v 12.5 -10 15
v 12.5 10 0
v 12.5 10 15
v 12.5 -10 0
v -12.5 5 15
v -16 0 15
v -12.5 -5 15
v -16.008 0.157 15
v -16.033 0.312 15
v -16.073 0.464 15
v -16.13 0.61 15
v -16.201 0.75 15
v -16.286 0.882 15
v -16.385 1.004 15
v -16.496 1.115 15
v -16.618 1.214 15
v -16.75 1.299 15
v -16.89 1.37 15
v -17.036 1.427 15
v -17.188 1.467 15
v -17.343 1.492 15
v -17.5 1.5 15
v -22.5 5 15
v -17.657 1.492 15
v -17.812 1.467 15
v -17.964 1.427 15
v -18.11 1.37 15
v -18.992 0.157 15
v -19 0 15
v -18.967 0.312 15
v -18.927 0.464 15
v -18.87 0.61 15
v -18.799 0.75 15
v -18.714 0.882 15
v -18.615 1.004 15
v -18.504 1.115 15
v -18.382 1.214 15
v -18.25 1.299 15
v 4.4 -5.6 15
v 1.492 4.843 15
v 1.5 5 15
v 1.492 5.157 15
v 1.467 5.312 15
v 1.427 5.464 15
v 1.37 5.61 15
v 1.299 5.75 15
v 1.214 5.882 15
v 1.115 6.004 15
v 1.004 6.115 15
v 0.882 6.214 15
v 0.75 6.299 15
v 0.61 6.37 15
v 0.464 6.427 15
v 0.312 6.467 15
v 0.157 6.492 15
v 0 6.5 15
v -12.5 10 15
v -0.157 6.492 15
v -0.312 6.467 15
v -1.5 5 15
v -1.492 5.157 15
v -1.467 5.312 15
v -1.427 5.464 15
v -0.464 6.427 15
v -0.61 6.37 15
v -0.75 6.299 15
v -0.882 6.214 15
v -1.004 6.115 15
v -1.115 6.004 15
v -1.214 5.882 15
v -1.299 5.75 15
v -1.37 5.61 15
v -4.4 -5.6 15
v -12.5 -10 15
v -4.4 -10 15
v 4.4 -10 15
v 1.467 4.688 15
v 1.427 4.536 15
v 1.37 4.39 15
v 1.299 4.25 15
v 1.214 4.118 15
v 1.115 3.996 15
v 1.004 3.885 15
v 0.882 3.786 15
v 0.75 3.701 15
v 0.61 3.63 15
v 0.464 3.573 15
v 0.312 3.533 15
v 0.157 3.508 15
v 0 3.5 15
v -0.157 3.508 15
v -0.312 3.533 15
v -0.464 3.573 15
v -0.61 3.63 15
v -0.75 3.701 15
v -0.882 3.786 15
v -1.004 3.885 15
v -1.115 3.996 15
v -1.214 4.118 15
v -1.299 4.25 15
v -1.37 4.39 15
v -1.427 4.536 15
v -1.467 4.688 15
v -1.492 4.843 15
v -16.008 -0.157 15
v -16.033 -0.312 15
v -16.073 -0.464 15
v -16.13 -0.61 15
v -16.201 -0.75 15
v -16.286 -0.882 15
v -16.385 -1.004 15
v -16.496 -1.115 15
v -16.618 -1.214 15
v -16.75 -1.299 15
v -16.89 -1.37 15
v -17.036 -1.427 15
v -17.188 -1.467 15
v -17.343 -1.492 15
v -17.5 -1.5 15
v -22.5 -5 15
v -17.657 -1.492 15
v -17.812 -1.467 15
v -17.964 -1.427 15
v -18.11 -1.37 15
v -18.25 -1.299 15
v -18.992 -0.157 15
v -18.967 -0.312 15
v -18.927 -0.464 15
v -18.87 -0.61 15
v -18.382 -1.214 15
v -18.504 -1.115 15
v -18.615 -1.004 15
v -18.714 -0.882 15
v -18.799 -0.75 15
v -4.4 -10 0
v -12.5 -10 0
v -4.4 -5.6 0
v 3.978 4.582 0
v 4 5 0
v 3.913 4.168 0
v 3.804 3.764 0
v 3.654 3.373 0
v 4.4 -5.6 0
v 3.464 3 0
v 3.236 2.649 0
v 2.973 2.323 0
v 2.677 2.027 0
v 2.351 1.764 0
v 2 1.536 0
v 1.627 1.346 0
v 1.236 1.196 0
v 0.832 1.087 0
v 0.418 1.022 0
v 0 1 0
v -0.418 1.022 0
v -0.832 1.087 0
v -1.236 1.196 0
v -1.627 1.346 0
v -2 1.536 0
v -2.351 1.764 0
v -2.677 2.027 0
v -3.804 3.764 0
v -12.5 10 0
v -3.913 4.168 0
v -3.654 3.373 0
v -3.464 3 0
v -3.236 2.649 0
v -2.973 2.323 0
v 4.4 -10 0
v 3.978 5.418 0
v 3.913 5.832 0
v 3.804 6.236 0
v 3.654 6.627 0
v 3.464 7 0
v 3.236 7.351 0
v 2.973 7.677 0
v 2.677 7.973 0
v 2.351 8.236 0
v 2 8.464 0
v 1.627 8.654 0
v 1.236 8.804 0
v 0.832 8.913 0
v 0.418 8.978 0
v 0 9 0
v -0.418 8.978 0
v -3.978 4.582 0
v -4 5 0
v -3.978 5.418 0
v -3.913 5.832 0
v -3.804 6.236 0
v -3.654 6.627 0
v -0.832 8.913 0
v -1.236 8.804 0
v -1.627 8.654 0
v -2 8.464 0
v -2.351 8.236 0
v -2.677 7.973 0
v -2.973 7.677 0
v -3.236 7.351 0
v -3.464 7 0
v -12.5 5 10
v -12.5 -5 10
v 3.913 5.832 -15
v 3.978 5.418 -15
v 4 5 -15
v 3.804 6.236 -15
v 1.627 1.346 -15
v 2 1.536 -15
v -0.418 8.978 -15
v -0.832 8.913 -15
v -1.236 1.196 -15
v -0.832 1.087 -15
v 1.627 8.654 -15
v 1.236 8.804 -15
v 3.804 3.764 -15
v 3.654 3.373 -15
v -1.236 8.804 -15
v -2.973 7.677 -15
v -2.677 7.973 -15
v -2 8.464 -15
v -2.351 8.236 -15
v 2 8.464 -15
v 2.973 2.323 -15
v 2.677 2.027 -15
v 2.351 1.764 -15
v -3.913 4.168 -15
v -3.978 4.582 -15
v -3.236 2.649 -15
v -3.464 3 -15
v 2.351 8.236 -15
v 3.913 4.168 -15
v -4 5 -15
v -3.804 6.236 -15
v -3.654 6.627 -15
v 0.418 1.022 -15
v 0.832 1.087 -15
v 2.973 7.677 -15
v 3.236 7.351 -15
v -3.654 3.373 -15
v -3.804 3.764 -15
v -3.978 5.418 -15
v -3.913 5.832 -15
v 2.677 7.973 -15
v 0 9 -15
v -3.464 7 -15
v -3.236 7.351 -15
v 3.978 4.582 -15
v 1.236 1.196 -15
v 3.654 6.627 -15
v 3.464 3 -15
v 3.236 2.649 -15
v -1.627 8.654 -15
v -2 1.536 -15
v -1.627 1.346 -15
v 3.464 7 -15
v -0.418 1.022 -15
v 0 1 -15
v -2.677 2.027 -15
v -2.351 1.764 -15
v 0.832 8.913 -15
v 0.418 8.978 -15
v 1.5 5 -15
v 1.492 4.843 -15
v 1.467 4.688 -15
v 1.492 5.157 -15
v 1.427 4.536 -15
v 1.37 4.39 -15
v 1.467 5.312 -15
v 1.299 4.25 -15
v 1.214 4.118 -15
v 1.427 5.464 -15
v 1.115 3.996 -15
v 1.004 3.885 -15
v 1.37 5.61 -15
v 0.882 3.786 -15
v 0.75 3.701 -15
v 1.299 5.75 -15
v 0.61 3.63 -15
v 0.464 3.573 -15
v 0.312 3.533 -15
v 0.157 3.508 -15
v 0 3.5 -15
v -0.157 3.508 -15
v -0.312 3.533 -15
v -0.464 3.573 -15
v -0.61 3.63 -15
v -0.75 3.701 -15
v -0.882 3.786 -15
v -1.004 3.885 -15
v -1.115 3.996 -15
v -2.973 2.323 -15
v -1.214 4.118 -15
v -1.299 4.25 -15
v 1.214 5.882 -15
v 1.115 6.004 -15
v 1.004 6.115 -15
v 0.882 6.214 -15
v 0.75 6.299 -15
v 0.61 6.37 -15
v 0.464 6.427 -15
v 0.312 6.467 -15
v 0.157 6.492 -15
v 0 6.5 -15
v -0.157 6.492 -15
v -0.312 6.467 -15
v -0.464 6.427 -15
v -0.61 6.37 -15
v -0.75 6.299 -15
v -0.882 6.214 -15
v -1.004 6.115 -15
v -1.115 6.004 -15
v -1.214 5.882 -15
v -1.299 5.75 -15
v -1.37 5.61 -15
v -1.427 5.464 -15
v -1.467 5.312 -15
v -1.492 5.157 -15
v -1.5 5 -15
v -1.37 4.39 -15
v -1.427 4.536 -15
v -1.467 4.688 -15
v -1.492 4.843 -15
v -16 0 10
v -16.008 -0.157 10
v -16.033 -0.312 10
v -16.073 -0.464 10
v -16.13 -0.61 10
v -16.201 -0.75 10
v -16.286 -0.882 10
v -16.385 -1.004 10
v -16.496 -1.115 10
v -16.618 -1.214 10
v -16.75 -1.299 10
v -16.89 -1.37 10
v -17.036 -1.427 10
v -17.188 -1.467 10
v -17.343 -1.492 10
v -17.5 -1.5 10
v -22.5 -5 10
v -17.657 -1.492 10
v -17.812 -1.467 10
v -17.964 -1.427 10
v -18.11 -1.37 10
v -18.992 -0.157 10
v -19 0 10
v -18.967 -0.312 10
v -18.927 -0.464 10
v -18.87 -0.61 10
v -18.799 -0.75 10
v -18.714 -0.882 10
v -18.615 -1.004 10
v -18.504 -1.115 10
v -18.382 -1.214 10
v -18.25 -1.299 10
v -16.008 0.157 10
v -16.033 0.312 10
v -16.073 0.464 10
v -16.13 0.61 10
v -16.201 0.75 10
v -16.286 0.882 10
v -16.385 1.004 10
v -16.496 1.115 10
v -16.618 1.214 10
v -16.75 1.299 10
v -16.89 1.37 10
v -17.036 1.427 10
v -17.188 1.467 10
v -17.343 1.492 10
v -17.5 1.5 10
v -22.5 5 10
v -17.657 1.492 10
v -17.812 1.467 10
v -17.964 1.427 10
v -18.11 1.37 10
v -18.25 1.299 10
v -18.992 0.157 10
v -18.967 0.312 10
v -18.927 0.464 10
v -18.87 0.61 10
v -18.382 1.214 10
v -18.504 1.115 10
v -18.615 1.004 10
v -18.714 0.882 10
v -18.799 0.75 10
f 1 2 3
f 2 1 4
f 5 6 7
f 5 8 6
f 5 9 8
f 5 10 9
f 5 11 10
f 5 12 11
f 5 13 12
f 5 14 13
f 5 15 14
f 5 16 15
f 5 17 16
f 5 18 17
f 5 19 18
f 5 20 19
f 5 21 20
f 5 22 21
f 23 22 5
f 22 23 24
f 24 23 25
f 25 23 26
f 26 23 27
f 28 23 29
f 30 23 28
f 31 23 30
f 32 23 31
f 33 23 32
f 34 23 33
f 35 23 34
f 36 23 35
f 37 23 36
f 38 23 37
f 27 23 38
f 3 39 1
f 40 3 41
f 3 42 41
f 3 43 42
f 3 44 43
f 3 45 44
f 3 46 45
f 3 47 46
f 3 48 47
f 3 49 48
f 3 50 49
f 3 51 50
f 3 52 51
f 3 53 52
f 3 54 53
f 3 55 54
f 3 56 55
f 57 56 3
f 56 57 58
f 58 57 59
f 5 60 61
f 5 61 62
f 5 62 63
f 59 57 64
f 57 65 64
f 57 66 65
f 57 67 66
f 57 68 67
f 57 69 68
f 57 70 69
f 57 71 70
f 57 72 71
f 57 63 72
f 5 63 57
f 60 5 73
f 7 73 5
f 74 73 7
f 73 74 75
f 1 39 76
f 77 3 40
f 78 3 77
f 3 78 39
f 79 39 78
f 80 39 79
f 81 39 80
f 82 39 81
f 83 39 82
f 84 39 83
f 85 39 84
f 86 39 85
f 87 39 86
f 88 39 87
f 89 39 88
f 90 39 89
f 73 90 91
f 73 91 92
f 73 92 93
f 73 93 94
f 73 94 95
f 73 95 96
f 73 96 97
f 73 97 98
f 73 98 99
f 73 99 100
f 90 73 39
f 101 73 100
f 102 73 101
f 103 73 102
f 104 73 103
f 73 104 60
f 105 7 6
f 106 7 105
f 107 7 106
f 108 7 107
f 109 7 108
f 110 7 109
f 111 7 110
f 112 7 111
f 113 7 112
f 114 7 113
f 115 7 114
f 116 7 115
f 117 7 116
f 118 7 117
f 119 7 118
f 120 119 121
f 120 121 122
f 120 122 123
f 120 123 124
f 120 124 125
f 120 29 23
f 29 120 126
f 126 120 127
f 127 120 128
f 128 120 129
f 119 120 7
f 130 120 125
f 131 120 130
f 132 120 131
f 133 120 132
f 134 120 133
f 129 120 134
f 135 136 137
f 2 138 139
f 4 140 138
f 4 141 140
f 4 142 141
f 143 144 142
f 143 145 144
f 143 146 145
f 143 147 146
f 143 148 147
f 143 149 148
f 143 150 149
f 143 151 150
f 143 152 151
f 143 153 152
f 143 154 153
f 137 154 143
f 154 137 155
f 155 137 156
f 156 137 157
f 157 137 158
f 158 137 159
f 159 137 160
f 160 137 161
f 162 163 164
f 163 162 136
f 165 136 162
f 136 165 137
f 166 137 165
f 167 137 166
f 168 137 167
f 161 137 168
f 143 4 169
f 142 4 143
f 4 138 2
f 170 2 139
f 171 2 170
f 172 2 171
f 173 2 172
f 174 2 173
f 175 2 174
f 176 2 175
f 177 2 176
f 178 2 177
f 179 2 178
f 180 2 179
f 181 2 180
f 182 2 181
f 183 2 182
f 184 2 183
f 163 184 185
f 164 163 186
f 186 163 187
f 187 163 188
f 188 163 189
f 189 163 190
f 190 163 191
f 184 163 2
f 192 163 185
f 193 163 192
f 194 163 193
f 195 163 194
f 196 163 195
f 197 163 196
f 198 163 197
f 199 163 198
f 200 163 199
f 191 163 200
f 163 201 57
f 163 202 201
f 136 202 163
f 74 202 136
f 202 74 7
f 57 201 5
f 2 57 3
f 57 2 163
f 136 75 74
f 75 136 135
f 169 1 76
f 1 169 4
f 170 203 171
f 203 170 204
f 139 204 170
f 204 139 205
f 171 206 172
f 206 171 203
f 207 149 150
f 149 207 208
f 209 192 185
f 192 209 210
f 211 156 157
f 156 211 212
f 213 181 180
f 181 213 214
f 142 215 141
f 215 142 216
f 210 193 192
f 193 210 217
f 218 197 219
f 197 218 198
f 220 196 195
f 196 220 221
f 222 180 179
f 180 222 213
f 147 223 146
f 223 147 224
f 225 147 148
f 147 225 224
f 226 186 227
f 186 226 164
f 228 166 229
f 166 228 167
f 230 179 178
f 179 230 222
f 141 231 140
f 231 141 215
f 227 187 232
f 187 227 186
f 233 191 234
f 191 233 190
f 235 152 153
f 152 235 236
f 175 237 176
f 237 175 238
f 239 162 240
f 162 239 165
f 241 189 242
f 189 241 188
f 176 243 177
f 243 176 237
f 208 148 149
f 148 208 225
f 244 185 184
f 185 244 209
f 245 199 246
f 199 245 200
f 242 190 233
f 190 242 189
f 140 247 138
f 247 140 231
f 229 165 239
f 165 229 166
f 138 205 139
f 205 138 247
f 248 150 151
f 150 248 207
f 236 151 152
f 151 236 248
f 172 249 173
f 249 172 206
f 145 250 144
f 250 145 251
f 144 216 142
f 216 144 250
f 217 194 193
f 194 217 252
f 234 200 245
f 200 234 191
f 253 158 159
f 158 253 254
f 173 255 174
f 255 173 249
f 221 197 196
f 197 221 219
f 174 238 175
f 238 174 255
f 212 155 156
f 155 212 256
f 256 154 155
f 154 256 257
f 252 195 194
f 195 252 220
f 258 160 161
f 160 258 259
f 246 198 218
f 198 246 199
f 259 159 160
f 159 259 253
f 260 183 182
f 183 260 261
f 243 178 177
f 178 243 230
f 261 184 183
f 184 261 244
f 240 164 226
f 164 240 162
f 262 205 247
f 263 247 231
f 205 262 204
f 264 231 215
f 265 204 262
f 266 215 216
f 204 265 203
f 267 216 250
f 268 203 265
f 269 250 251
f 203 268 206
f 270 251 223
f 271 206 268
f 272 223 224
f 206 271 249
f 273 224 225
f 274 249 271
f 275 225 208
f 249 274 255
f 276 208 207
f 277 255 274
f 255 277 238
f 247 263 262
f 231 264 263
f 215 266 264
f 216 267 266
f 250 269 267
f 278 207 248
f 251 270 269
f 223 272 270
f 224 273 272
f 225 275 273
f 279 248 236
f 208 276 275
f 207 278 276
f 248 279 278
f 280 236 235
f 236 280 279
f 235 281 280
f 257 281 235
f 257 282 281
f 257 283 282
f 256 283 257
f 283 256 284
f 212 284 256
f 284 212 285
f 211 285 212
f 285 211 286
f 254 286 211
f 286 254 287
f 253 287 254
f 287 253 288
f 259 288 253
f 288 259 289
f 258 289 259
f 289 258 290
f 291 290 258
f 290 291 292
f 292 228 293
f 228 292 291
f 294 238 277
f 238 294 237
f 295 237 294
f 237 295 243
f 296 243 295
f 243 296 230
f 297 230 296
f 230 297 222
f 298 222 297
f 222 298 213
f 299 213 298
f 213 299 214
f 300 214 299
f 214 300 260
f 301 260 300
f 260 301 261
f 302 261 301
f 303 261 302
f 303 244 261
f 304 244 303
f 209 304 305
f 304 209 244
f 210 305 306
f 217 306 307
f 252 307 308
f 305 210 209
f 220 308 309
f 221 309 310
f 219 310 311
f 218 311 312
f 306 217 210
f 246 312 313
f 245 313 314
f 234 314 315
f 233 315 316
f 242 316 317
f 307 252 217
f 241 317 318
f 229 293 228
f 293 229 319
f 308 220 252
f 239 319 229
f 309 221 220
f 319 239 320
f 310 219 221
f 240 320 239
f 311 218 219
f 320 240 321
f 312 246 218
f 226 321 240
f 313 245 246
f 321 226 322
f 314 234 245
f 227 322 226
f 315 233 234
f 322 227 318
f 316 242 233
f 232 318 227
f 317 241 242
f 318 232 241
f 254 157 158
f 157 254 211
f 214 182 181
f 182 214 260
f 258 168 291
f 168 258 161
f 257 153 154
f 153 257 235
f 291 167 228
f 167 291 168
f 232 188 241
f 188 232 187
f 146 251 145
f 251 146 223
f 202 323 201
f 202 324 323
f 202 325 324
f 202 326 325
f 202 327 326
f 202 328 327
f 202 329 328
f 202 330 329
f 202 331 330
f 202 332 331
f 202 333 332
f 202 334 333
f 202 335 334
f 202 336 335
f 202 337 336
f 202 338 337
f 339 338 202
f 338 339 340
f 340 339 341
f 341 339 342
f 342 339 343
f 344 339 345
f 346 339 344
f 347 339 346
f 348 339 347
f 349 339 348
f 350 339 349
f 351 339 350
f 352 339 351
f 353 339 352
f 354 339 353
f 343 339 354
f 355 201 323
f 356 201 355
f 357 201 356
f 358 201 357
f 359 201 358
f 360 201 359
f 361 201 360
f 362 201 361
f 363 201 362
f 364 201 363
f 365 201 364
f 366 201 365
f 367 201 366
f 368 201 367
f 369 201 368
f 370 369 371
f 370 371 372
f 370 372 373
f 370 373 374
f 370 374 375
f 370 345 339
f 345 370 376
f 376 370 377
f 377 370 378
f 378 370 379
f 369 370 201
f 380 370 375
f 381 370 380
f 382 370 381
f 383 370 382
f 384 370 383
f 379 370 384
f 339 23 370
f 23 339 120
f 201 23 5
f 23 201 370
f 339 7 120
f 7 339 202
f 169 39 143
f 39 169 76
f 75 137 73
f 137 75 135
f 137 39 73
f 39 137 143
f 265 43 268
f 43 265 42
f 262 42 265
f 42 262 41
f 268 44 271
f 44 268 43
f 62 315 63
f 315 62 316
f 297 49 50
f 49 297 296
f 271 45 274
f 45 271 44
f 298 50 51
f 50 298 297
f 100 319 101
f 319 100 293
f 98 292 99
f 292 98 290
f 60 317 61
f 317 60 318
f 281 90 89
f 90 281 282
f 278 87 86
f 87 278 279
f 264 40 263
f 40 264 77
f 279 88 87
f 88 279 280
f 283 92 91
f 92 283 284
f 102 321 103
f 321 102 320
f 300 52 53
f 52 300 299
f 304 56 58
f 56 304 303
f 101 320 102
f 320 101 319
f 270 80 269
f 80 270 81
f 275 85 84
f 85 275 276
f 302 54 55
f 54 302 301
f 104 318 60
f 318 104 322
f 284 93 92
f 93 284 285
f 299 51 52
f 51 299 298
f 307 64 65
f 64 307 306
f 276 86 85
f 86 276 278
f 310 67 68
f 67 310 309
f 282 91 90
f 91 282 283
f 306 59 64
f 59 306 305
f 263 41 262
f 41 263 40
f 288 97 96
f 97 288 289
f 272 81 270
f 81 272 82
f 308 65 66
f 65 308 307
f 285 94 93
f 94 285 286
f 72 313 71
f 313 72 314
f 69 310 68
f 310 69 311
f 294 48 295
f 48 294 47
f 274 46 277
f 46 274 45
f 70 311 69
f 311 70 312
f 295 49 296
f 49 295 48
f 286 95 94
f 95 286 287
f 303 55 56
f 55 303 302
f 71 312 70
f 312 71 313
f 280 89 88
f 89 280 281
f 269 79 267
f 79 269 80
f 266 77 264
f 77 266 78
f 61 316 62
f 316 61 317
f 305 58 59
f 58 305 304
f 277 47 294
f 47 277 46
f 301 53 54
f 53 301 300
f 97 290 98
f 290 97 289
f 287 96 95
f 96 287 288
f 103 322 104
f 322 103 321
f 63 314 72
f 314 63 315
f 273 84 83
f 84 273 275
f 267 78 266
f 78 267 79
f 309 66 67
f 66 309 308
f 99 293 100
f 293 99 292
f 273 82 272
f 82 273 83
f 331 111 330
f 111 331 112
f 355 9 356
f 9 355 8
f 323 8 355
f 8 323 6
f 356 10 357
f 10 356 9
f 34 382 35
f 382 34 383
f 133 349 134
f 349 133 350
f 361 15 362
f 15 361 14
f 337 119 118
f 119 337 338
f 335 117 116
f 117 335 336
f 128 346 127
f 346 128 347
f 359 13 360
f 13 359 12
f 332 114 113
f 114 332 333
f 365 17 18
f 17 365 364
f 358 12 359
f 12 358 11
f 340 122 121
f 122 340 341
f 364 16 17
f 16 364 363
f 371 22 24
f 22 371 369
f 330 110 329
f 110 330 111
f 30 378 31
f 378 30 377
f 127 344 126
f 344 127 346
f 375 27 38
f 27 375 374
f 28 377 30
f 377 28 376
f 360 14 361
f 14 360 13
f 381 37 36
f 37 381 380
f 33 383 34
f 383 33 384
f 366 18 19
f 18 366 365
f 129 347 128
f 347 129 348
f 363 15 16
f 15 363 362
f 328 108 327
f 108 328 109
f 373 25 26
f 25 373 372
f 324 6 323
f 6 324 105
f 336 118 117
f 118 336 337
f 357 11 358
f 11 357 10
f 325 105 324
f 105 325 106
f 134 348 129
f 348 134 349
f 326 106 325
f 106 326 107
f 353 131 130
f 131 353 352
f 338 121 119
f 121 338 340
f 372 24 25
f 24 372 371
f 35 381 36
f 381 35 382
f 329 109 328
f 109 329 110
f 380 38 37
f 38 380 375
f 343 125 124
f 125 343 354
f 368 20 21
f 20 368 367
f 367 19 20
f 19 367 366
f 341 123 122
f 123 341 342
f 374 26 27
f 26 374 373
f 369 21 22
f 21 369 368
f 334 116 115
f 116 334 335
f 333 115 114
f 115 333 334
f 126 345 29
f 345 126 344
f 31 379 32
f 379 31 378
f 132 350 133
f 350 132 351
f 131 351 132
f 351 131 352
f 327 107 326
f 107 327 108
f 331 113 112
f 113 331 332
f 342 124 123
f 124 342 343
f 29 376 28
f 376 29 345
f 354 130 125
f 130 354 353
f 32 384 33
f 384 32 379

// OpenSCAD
// file: parameters.scad
// =============================================================================
// Coil Winder - Common Parameters
// DTU 34621 Metal Detector Project
// =============================================================================

// -----------------------------------------------------------------------------
// Hardware Dimensions
// -----------------------------------------------------------------------------

// M8 Threaded Rod (Spindle)
spindle_dia = 8;
spindle_length = 300;

// 608ZZ Bearing (Skateboard bearing)
bearing_od = 22;
bearing_id = 8;
bearing_width = 7;

// M3 Hardware
m3_bolt_dia = 3.2;
m3_nut_dia = 6.4;
m3_nut_height = 2.4;
m3_head_dia = 5.5;
m3_head_height = 3;

// M8 Hardware
m8_nut_dia = 14.6;
m8_nut_height = 6.5;

// -----------------------------------------------------------------------------
// Servo Dimensions (SG90 / MG90S style)
// -----------------------------------------------------------------------------

servo_body_w = 23;
servo_body_h = 22.5;
servo_body_d = 12.5;
servo_tab_w = 32.5;
servo_tab_h = 2.5;
servo_tab_offset = 15.5;  // from bottom
servo_mount_hole_spacing = 28;
servo_shaft_offset = 5.5;  // from center of body
servo_horn_length = 15;

// -----------------------------------------------------------------------------
// ITR8307 Optical Sensor
// -----------------------------------------------------------------------------

itr8307_width = 10.8;
itr8307_depth = 5.2;
itr8307_height = 6.3;
itr8307_slot_width = 3;
itr8307_slot_depth = 4;

// -----------------------------------------------------------------------------
// Coil Dimensions
// -----------------------------------------------------------------------------

// TX Coil - 200mm diameter
tx_coil_dia = 200;
tx_coil_width = 18;
tx_coil_turns = 68;

// RX Coil - 80mm diameter
rx_coil_dia = 80;
rx_coil_width = 14;
rx_coil_turns = 170;

// Bucking Coil - 120mm diameter
buck_coil_dia = 120;
buck_coil_width = 18;
buck_coil_turns = 35;

// -----------------------------------------------------------------------------
// Frame Dimensions
// -----------------------------------------------------------------------------

base_length = 250;
base_width = 120;
base_thickness = 5;

bearing_mount_height = 40;
bearing_mount_width = 35;
bearing_mount_depth = 25;

// Distance between bearing centers
spindle_span = 200;

// -----------------------------------------------------------------------------
// Wire Guide / Traverse
// -----------------------------------------------------------------------------

guide_rail_length = 80;
guide_rail_width = 10;
guide_rail_height = 5;

carriage_width = 25;
carriage_depth = 20;
carriage_height = 15;

// -----------------------------------------------------------------------------
// Encoder Wheel
// -----------------------------------------------------------------------------

encoder_wheel_dia = 40;
encoder_wheel_thickness = 5;
encoder_slot_width = 5;
encoder_slot_depth = 12;

// -----------------------------------------------------------------------------
// General Tolerances
// -----------------------------------------------------------------------------

clearance = 0.3;        // General clearance for fitting parts
press_fit = 0.1;        // Tight fit
slide_fit = 0.4;        // Sliding fit

// -----------------------------------------------------------------------------
// Print Settings
// -----------------------------------------------------------------------------

wall_thickness = 2.4;   // 3 perimeters at 0.4mm nozzle
layer_height = 0.2;

$fn = 60;  // Circle resolution
// main file
// =============================================================================
// Wire Guide Carriage - Slides on rail, guides wire to coil
// =============================================================================

include <parameters.scad>

// Rail dimensions (simple rectangular rail)
rail_width = 8;
rail_height = 4;

module wire_guide_carriage() {
    guide_hole_dia = 3;  // Wire guide hole
    linkage_hole_dia = 3;  // For push rod connection

    difference() {
        union() {
            // Main body
            translate([-carriage_width/2, -carriage_depth/2, 0])
                cube([carriage_width, carriage_depth, carriage_height]);

            // Wire guide tube extending down
            translate([0, carriage_depth/2 - 5, -15])
                cylinder(d=8, h=15);

            // Linkage arm (connects to servo push rod)
            translate([-carriage_width/2 - 10, -5, carriage_height - 5])
                cube([15, 10, 5]);
        }

        // Rail slot (slides on rail)
        translate([-(rail_width + slide_fit*2)/2, -carriage_depth/2 - 0.1, -0.1])
            cube([rail_width + slide_fit*2, rail_height + slide_fit + 0.1, carriage_height + 0.2]);

        // Wire guide hole
        translate([0, carriage_depth/2 - 5, -15.1])
            cylinder(d=guide_hole_dia, h=carriage_height + 15.2);

        // Linkage pivot hole
        translate([-carriage_width/2 - 5, 0, carriage_height - 2.5])
            rotate([0, 0, 0])
                cylinder(d=linkage_hole_dia, h=10, center=true);
    }
}

// Guide rail (for reference)
module guide_rail() {
    color("gray")
    translate([-guide_rail_length/2, -carriage_depth/2, 0])
        cube([guide_rail_length, rail_height, rail_width]);
}

// Render for export
wire_guide_carriage();

// Show rail for reference (comment out for export)
// translate([0, 0, -rail_width]) guide_rail();
